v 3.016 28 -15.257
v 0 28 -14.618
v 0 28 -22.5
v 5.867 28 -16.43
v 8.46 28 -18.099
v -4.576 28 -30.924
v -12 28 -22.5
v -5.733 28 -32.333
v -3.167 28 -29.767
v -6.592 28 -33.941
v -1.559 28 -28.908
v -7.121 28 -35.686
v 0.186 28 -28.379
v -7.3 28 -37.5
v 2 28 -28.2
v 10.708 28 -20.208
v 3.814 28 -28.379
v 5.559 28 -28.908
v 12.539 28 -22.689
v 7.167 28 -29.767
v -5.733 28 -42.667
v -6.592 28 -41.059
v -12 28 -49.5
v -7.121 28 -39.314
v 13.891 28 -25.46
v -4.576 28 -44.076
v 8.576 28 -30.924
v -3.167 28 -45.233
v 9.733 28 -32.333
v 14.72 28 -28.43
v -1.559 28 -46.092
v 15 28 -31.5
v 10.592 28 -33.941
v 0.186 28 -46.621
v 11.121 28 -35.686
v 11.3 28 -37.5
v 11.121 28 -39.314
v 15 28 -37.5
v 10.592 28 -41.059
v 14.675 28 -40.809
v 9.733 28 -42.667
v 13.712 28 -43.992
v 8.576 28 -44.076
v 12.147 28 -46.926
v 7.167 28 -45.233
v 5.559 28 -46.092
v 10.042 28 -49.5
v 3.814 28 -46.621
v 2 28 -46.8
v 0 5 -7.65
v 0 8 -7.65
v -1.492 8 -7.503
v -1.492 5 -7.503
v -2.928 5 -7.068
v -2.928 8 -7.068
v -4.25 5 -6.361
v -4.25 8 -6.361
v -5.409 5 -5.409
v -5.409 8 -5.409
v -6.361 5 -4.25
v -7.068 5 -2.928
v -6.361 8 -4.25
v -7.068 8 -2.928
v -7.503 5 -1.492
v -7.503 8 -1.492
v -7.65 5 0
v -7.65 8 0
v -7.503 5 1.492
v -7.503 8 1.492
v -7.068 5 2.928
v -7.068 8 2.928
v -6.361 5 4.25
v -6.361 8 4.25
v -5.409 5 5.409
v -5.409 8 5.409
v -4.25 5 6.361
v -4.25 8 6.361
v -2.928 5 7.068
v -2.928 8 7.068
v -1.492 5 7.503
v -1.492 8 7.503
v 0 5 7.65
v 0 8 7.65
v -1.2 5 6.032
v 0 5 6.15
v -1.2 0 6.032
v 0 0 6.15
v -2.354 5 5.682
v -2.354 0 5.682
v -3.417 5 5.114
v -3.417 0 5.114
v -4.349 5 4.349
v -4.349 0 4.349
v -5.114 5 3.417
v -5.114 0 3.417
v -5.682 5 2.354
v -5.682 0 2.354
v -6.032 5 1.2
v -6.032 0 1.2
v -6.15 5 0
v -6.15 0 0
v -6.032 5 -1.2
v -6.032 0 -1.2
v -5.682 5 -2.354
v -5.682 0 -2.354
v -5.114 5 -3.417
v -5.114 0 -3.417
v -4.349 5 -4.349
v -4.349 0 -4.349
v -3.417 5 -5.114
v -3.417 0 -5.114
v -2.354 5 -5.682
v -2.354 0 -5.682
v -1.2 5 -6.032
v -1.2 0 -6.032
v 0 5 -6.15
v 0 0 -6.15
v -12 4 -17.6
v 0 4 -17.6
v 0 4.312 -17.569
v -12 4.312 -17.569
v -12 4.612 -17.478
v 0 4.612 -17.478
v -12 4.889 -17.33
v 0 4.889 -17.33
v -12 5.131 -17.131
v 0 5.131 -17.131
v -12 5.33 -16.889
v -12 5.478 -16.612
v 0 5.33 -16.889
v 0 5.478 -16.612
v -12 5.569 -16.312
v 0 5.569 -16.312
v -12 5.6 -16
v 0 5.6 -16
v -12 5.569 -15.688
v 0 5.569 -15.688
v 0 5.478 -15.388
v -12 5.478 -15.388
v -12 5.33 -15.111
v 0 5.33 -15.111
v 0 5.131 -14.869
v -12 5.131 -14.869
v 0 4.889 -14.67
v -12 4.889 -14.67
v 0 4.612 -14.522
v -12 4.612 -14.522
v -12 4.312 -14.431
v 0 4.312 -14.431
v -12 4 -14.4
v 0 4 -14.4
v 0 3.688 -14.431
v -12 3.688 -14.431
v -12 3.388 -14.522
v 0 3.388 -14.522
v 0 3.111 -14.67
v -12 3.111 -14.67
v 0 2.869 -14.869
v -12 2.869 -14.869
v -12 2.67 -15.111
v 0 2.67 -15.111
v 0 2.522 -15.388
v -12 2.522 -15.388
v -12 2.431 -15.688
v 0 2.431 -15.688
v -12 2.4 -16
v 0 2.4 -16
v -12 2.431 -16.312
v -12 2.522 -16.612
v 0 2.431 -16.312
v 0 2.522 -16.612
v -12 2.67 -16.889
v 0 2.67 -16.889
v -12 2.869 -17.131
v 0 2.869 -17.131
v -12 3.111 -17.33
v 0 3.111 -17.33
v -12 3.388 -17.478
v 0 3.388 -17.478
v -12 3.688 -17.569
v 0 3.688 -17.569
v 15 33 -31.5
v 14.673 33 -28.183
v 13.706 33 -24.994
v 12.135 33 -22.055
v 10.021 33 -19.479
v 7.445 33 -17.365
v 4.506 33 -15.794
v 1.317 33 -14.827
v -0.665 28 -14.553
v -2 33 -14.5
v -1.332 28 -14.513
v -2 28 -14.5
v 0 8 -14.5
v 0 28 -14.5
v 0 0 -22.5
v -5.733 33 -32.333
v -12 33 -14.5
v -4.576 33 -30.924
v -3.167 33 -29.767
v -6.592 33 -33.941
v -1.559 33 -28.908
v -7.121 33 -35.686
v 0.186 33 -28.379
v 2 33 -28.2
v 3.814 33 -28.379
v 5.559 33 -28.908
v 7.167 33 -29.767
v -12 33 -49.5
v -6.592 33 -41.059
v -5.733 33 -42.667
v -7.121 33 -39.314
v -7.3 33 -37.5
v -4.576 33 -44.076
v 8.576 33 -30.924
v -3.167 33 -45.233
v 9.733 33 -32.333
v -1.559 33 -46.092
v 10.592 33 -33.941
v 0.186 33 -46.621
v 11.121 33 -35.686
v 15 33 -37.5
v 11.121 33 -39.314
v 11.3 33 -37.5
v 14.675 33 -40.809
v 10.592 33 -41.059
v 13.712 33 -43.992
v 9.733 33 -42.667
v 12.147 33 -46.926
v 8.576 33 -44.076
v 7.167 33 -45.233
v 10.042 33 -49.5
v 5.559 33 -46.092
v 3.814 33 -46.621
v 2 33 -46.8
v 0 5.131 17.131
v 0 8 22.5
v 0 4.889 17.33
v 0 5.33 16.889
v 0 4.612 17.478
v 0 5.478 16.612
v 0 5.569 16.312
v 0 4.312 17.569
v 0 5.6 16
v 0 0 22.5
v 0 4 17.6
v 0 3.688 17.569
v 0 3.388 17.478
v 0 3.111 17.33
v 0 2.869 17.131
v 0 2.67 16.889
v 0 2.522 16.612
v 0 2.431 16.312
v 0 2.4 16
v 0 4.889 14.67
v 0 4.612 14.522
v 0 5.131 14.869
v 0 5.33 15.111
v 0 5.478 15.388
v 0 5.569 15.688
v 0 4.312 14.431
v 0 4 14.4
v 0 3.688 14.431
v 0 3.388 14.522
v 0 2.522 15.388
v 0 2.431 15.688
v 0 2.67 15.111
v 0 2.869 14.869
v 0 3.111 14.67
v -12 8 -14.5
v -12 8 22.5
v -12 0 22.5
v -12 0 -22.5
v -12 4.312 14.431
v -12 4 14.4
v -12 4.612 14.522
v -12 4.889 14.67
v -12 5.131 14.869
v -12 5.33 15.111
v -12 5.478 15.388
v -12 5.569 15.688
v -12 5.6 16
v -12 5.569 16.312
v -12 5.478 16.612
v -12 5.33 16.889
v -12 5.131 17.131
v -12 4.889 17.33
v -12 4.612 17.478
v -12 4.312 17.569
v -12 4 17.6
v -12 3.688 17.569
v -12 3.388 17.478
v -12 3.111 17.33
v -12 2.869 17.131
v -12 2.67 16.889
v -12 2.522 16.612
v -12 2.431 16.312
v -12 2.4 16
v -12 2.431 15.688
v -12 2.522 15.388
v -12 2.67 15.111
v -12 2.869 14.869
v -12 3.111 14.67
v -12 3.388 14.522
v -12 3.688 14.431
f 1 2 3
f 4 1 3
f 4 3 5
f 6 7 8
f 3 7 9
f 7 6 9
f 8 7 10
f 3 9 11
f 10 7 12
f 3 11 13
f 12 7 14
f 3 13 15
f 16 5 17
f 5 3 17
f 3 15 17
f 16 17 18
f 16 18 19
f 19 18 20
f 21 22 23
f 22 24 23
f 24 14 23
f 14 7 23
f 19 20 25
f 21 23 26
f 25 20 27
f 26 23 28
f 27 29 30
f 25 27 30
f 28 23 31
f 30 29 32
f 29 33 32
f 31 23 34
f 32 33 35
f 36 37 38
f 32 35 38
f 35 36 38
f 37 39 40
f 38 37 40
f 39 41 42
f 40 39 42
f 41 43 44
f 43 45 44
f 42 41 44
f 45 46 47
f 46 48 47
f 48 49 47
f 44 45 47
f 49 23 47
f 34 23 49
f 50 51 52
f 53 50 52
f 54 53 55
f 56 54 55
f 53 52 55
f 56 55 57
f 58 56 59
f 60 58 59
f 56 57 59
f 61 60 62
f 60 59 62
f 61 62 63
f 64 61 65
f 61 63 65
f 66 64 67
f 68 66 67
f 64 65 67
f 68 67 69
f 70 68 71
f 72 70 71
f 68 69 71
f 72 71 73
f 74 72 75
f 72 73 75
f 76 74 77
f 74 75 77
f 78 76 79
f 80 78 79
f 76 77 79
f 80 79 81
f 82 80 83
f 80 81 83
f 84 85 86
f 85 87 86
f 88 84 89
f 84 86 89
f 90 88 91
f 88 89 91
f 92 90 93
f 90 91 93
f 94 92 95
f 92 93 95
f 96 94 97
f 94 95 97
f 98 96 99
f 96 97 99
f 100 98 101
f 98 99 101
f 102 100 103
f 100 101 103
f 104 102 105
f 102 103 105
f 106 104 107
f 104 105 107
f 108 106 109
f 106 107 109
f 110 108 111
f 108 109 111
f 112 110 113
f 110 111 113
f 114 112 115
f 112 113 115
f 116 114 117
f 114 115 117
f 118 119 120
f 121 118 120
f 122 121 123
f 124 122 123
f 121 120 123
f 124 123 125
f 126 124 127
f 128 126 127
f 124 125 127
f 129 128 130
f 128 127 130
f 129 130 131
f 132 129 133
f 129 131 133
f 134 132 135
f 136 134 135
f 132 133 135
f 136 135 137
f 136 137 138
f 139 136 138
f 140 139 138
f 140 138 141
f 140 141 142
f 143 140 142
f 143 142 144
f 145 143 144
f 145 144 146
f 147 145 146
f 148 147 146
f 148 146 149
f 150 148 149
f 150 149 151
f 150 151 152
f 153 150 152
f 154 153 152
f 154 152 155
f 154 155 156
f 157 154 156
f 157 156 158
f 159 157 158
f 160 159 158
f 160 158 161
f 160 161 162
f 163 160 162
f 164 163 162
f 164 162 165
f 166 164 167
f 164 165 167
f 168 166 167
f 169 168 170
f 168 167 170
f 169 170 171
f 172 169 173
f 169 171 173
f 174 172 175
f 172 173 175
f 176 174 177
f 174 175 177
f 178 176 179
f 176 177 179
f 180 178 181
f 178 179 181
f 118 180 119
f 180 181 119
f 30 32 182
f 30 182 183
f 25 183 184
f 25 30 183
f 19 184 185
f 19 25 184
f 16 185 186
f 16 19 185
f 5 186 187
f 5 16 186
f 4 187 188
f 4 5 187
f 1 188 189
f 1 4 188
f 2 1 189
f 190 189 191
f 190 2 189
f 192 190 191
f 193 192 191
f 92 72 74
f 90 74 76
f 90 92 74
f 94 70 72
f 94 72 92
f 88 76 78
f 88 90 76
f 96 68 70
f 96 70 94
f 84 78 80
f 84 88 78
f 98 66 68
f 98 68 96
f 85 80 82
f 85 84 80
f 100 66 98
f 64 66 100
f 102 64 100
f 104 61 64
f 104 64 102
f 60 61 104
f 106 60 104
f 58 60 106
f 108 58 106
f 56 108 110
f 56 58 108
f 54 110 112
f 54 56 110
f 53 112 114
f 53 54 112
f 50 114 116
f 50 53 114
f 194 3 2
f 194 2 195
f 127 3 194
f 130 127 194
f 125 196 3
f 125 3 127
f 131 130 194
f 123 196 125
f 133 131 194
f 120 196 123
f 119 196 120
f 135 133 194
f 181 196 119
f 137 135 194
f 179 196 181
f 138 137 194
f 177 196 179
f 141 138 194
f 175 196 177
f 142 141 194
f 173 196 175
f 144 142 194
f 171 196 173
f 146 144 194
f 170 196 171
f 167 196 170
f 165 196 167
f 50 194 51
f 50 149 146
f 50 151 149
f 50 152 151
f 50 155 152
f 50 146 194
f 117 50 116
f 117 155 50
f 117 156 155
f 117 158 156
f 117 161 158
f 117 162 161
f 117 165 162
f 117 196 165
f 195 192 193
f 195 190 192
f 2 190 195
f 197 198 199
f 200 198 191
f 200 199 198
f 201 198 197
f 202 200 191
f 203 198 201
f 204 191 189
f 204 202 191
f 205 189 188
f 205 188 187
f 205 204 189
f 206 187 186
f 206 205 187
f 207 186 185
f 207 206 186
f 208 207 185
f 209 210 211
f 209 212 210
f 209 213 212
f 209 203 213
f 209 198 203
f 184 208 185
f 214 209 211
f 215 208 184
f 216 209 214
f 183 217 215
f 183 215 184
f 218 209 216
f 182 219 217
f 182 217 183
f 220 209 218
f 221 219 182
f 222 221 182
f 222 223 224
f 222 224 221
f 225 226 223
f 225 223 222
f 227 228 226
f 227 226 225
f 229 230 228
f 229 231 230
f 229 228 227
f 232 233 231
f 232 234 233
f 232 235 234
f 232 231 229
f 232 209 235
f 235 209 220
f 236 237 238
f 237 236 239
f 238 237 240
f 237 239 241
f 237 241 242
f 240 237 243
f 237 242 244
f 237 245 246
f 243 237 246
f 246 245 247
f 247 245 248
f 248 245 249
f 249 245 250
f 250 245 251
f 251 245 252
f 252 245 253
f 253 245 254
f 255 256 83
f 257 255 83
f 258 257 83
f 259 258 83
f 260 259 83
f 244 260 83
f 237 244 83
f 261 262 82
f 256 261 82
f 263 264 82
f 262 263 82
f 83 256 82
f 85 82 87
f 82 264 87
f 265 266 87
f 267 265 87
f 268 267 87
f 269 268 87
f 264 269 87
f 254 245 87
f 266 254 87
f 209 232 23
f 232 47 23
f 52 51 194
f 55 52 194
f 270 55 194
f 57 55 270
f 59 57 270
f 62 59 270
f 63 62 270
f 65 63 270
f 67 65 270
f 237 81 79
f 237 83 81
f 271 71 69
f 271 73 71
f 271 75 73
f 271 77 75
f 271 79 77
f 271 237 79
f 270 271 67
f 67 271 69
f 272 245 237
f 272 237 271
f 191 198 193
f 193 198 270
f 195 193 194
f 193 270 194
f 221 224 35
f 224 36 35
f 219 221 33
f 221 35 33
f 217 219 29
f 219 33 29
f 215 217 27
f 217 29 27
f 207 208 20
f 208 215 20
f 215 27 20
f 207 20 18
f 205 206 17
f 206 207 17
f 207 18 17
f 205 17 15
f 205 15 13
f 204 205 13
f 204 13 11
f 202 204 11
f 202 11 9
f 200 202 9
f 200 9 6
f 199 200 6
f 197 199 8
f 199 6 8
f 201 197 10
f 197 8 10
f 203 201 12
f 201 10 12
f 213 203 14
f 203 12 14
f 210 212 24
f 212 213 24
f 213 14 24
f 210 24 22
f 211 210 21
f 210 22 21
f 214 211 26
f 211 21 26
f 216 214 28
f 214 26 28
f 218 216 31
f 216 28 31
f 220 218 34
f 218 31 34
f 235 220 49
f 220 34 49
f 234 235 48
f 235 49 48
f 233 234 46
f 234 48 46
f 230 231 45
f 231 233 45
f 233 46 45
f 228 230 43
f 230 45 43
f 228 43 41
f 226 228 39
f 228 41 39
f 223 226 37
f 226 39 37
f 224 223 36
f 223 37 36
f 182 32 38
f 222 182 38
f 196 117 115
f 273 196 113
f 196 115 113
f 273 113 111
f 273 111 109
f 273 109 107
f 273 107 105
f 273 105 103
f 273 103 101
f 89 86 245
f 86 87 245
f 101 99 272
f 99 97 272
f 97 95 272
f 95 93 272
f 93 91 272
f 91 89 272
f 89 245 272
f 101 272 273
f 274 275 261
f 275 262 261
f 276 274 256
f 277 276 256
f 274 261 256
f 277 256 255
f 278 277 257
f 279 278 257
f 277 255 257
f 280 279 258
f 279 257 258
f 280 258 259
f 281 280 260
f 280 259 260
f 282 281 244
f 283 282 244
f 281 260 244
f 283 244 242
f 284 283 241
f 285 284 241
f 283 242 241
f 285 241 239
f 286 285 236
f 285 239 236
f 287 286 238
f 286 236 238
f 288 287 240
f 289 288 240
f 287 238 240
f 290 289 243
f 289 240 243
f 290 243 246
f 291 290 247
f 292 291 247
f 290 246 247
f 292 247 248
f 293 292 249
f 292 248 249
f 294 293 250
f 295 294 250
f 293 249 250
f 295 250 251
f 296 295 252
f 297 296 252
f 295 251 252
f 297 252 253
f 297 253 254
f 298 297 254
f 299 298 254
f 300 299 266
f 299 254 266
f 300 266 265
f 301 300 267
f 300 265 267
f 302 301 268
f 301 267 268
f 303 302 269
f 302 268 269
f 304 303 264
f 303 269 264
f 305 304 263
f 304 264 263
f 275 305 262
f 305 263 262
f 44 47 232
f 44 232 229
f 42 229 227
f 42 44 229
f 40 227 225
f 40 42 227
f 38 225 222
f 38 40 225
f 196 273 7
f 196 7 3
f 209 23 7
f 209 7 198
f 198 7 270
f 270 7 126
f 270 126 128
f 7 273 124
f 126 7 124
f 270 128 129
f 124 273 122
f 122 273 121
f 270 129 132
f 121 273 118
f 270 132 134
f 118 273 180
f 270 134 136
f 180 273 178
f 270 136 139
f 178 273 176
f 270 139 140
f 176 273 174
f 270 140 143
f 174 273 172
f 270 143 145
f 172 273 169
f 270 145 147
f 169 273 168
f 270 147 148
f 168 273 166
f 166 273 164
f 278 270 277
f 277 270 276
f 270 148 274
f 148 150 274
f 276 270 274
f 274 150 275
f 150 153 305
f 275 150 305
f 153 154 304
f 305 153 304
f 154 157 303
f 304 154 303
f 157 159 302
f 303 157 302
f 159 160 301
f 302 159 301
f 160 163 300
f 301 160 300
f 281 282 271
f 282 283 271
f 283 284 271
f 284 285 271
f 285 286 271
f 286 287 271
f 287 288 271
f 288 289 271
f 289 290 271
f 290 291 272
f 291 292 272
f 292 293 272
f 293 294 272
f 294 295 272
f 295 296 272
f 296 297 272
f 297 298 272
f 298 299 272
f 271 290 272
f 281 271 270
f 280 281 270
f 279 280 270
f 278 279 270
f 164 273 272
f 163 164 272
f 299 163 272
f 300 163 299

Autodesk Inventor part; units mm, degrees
ref_plane "YZ Plane" through (0, 0, 0) normal (1, 0, 0) x (0, 1, 0)
ref_plane "XZ Plane" through (0, 0, 0) normal (0, 1, 0) x (-1, 0, 0)
ref_plane "XY Plane" through (0, 0, 0) normal (0, 0, 1) x (1, 0, 0)
sketch "Sketch1" plane through (0, 0, 0) normal (0, 1, 0) x (-1, 0, 0)
  line L0 (0, 22.5) -> (12, 22.5)
  line L1 (12, 22.5) -> (12, -22.5)
  line L2 (12, -22.5) -> (0, -22.5)
  arc A0 (0, -6.15) -> (0, 6.15) centre (0, 0) ccw
  line L3 (0, 22.5) -> (0, 6.15)
  line L4 (0, -6.15) -> (0, -22.5)
  point P0 (12, 0)
  dimension "d0" = 12
  dimension "d1" = 45
  dimension "d2" = 6.15
extrude "Extrusion1" add sketch "Sketch1" along normal blind 8
sketch "Sketch2" plane through (0, 8, 0) normal (0, 1, 0) x (1, 0, 0)
  line L0 (0, -22.5) -> (0, -6.15) projected
  arc A0 (0, 7.65) -> (0, -7.65) centre (0, 0) ccw
  line L1 (0, -7.65) -> (0, 7.65)
  dimension "d5" = 7.65
extrude "Extrusion2" cut sketch "Sketch2" against normal blind 3
sketch "Sketch3" plane through (0, 0, 22.5) normal (1, 0, 0) x (0, 0, -1)
  circle A0 centre (6.5, 4) radius 1.6
  circle A1 centre (38.5, 4) radius 1.6
  line L0 (16.35, 0) -> (0, 0) projected
  point P0 (22.5, 0)
  dimension "d8" = 3.2
  dimension "d9" = 32
  dimension "d10" = 4
  dimension "d11" = 16
extrude "Extrusion3" cut sketch "Sketch3" against normal up to next
sketch "Sketch4" plane through (0, 8, 0) normal (0, 1, 0) x (1, 0, 0)
  line L0 (-12, 22.5) -> (0, 22.5)
  line L1 (0, 22.5) -> (0, 14.5)
  line L2 (0, 14.5) -> (-12, 14.5)
  line L3 (-12, 14.5) -> (-12, 22.5)
  point P0 (0, 0)
  dimension "d14" = 8
extrude "Extrusion4" add sketch "Sketch4" along normal blind 20
sketch "Sketch5" plane through (0, 28, 0) normal (0, 1, 0) x (1, 0, 0)
  line L0 (10.0416, 49.5) -> (-12, 49.5)
  line L1 (-12, 49.5) -> (-12, 14.5)
  arc A0 (-2, 14.5) -> (15, 31.5) centre (-2, 31.5) ccw
  line L2 (-12, 14.5) -> (-2, 14.5)
  line L3 (15, 31.5) -> (15, 37.5)
  arc A1 (15, 37.5) -> (10.0416, 49.5) centre (-2, 37.5) ccw
  circle A2 centre (2, 37.5) radius 9.3
  point P0 (0, 0)
  dimension "d19" = 35
  dimension "d20" = 17
  dimension "d21" = 10
  dimension "d22" = 6
  dimension "d23" = 18.6
  dimension "d24" = 14
extrude "Extrusion5" add sketch "Sketch5" along normal blind 5
equation "\"d11\" = 0.5 * d9"
properties material "ABS Plastic"
